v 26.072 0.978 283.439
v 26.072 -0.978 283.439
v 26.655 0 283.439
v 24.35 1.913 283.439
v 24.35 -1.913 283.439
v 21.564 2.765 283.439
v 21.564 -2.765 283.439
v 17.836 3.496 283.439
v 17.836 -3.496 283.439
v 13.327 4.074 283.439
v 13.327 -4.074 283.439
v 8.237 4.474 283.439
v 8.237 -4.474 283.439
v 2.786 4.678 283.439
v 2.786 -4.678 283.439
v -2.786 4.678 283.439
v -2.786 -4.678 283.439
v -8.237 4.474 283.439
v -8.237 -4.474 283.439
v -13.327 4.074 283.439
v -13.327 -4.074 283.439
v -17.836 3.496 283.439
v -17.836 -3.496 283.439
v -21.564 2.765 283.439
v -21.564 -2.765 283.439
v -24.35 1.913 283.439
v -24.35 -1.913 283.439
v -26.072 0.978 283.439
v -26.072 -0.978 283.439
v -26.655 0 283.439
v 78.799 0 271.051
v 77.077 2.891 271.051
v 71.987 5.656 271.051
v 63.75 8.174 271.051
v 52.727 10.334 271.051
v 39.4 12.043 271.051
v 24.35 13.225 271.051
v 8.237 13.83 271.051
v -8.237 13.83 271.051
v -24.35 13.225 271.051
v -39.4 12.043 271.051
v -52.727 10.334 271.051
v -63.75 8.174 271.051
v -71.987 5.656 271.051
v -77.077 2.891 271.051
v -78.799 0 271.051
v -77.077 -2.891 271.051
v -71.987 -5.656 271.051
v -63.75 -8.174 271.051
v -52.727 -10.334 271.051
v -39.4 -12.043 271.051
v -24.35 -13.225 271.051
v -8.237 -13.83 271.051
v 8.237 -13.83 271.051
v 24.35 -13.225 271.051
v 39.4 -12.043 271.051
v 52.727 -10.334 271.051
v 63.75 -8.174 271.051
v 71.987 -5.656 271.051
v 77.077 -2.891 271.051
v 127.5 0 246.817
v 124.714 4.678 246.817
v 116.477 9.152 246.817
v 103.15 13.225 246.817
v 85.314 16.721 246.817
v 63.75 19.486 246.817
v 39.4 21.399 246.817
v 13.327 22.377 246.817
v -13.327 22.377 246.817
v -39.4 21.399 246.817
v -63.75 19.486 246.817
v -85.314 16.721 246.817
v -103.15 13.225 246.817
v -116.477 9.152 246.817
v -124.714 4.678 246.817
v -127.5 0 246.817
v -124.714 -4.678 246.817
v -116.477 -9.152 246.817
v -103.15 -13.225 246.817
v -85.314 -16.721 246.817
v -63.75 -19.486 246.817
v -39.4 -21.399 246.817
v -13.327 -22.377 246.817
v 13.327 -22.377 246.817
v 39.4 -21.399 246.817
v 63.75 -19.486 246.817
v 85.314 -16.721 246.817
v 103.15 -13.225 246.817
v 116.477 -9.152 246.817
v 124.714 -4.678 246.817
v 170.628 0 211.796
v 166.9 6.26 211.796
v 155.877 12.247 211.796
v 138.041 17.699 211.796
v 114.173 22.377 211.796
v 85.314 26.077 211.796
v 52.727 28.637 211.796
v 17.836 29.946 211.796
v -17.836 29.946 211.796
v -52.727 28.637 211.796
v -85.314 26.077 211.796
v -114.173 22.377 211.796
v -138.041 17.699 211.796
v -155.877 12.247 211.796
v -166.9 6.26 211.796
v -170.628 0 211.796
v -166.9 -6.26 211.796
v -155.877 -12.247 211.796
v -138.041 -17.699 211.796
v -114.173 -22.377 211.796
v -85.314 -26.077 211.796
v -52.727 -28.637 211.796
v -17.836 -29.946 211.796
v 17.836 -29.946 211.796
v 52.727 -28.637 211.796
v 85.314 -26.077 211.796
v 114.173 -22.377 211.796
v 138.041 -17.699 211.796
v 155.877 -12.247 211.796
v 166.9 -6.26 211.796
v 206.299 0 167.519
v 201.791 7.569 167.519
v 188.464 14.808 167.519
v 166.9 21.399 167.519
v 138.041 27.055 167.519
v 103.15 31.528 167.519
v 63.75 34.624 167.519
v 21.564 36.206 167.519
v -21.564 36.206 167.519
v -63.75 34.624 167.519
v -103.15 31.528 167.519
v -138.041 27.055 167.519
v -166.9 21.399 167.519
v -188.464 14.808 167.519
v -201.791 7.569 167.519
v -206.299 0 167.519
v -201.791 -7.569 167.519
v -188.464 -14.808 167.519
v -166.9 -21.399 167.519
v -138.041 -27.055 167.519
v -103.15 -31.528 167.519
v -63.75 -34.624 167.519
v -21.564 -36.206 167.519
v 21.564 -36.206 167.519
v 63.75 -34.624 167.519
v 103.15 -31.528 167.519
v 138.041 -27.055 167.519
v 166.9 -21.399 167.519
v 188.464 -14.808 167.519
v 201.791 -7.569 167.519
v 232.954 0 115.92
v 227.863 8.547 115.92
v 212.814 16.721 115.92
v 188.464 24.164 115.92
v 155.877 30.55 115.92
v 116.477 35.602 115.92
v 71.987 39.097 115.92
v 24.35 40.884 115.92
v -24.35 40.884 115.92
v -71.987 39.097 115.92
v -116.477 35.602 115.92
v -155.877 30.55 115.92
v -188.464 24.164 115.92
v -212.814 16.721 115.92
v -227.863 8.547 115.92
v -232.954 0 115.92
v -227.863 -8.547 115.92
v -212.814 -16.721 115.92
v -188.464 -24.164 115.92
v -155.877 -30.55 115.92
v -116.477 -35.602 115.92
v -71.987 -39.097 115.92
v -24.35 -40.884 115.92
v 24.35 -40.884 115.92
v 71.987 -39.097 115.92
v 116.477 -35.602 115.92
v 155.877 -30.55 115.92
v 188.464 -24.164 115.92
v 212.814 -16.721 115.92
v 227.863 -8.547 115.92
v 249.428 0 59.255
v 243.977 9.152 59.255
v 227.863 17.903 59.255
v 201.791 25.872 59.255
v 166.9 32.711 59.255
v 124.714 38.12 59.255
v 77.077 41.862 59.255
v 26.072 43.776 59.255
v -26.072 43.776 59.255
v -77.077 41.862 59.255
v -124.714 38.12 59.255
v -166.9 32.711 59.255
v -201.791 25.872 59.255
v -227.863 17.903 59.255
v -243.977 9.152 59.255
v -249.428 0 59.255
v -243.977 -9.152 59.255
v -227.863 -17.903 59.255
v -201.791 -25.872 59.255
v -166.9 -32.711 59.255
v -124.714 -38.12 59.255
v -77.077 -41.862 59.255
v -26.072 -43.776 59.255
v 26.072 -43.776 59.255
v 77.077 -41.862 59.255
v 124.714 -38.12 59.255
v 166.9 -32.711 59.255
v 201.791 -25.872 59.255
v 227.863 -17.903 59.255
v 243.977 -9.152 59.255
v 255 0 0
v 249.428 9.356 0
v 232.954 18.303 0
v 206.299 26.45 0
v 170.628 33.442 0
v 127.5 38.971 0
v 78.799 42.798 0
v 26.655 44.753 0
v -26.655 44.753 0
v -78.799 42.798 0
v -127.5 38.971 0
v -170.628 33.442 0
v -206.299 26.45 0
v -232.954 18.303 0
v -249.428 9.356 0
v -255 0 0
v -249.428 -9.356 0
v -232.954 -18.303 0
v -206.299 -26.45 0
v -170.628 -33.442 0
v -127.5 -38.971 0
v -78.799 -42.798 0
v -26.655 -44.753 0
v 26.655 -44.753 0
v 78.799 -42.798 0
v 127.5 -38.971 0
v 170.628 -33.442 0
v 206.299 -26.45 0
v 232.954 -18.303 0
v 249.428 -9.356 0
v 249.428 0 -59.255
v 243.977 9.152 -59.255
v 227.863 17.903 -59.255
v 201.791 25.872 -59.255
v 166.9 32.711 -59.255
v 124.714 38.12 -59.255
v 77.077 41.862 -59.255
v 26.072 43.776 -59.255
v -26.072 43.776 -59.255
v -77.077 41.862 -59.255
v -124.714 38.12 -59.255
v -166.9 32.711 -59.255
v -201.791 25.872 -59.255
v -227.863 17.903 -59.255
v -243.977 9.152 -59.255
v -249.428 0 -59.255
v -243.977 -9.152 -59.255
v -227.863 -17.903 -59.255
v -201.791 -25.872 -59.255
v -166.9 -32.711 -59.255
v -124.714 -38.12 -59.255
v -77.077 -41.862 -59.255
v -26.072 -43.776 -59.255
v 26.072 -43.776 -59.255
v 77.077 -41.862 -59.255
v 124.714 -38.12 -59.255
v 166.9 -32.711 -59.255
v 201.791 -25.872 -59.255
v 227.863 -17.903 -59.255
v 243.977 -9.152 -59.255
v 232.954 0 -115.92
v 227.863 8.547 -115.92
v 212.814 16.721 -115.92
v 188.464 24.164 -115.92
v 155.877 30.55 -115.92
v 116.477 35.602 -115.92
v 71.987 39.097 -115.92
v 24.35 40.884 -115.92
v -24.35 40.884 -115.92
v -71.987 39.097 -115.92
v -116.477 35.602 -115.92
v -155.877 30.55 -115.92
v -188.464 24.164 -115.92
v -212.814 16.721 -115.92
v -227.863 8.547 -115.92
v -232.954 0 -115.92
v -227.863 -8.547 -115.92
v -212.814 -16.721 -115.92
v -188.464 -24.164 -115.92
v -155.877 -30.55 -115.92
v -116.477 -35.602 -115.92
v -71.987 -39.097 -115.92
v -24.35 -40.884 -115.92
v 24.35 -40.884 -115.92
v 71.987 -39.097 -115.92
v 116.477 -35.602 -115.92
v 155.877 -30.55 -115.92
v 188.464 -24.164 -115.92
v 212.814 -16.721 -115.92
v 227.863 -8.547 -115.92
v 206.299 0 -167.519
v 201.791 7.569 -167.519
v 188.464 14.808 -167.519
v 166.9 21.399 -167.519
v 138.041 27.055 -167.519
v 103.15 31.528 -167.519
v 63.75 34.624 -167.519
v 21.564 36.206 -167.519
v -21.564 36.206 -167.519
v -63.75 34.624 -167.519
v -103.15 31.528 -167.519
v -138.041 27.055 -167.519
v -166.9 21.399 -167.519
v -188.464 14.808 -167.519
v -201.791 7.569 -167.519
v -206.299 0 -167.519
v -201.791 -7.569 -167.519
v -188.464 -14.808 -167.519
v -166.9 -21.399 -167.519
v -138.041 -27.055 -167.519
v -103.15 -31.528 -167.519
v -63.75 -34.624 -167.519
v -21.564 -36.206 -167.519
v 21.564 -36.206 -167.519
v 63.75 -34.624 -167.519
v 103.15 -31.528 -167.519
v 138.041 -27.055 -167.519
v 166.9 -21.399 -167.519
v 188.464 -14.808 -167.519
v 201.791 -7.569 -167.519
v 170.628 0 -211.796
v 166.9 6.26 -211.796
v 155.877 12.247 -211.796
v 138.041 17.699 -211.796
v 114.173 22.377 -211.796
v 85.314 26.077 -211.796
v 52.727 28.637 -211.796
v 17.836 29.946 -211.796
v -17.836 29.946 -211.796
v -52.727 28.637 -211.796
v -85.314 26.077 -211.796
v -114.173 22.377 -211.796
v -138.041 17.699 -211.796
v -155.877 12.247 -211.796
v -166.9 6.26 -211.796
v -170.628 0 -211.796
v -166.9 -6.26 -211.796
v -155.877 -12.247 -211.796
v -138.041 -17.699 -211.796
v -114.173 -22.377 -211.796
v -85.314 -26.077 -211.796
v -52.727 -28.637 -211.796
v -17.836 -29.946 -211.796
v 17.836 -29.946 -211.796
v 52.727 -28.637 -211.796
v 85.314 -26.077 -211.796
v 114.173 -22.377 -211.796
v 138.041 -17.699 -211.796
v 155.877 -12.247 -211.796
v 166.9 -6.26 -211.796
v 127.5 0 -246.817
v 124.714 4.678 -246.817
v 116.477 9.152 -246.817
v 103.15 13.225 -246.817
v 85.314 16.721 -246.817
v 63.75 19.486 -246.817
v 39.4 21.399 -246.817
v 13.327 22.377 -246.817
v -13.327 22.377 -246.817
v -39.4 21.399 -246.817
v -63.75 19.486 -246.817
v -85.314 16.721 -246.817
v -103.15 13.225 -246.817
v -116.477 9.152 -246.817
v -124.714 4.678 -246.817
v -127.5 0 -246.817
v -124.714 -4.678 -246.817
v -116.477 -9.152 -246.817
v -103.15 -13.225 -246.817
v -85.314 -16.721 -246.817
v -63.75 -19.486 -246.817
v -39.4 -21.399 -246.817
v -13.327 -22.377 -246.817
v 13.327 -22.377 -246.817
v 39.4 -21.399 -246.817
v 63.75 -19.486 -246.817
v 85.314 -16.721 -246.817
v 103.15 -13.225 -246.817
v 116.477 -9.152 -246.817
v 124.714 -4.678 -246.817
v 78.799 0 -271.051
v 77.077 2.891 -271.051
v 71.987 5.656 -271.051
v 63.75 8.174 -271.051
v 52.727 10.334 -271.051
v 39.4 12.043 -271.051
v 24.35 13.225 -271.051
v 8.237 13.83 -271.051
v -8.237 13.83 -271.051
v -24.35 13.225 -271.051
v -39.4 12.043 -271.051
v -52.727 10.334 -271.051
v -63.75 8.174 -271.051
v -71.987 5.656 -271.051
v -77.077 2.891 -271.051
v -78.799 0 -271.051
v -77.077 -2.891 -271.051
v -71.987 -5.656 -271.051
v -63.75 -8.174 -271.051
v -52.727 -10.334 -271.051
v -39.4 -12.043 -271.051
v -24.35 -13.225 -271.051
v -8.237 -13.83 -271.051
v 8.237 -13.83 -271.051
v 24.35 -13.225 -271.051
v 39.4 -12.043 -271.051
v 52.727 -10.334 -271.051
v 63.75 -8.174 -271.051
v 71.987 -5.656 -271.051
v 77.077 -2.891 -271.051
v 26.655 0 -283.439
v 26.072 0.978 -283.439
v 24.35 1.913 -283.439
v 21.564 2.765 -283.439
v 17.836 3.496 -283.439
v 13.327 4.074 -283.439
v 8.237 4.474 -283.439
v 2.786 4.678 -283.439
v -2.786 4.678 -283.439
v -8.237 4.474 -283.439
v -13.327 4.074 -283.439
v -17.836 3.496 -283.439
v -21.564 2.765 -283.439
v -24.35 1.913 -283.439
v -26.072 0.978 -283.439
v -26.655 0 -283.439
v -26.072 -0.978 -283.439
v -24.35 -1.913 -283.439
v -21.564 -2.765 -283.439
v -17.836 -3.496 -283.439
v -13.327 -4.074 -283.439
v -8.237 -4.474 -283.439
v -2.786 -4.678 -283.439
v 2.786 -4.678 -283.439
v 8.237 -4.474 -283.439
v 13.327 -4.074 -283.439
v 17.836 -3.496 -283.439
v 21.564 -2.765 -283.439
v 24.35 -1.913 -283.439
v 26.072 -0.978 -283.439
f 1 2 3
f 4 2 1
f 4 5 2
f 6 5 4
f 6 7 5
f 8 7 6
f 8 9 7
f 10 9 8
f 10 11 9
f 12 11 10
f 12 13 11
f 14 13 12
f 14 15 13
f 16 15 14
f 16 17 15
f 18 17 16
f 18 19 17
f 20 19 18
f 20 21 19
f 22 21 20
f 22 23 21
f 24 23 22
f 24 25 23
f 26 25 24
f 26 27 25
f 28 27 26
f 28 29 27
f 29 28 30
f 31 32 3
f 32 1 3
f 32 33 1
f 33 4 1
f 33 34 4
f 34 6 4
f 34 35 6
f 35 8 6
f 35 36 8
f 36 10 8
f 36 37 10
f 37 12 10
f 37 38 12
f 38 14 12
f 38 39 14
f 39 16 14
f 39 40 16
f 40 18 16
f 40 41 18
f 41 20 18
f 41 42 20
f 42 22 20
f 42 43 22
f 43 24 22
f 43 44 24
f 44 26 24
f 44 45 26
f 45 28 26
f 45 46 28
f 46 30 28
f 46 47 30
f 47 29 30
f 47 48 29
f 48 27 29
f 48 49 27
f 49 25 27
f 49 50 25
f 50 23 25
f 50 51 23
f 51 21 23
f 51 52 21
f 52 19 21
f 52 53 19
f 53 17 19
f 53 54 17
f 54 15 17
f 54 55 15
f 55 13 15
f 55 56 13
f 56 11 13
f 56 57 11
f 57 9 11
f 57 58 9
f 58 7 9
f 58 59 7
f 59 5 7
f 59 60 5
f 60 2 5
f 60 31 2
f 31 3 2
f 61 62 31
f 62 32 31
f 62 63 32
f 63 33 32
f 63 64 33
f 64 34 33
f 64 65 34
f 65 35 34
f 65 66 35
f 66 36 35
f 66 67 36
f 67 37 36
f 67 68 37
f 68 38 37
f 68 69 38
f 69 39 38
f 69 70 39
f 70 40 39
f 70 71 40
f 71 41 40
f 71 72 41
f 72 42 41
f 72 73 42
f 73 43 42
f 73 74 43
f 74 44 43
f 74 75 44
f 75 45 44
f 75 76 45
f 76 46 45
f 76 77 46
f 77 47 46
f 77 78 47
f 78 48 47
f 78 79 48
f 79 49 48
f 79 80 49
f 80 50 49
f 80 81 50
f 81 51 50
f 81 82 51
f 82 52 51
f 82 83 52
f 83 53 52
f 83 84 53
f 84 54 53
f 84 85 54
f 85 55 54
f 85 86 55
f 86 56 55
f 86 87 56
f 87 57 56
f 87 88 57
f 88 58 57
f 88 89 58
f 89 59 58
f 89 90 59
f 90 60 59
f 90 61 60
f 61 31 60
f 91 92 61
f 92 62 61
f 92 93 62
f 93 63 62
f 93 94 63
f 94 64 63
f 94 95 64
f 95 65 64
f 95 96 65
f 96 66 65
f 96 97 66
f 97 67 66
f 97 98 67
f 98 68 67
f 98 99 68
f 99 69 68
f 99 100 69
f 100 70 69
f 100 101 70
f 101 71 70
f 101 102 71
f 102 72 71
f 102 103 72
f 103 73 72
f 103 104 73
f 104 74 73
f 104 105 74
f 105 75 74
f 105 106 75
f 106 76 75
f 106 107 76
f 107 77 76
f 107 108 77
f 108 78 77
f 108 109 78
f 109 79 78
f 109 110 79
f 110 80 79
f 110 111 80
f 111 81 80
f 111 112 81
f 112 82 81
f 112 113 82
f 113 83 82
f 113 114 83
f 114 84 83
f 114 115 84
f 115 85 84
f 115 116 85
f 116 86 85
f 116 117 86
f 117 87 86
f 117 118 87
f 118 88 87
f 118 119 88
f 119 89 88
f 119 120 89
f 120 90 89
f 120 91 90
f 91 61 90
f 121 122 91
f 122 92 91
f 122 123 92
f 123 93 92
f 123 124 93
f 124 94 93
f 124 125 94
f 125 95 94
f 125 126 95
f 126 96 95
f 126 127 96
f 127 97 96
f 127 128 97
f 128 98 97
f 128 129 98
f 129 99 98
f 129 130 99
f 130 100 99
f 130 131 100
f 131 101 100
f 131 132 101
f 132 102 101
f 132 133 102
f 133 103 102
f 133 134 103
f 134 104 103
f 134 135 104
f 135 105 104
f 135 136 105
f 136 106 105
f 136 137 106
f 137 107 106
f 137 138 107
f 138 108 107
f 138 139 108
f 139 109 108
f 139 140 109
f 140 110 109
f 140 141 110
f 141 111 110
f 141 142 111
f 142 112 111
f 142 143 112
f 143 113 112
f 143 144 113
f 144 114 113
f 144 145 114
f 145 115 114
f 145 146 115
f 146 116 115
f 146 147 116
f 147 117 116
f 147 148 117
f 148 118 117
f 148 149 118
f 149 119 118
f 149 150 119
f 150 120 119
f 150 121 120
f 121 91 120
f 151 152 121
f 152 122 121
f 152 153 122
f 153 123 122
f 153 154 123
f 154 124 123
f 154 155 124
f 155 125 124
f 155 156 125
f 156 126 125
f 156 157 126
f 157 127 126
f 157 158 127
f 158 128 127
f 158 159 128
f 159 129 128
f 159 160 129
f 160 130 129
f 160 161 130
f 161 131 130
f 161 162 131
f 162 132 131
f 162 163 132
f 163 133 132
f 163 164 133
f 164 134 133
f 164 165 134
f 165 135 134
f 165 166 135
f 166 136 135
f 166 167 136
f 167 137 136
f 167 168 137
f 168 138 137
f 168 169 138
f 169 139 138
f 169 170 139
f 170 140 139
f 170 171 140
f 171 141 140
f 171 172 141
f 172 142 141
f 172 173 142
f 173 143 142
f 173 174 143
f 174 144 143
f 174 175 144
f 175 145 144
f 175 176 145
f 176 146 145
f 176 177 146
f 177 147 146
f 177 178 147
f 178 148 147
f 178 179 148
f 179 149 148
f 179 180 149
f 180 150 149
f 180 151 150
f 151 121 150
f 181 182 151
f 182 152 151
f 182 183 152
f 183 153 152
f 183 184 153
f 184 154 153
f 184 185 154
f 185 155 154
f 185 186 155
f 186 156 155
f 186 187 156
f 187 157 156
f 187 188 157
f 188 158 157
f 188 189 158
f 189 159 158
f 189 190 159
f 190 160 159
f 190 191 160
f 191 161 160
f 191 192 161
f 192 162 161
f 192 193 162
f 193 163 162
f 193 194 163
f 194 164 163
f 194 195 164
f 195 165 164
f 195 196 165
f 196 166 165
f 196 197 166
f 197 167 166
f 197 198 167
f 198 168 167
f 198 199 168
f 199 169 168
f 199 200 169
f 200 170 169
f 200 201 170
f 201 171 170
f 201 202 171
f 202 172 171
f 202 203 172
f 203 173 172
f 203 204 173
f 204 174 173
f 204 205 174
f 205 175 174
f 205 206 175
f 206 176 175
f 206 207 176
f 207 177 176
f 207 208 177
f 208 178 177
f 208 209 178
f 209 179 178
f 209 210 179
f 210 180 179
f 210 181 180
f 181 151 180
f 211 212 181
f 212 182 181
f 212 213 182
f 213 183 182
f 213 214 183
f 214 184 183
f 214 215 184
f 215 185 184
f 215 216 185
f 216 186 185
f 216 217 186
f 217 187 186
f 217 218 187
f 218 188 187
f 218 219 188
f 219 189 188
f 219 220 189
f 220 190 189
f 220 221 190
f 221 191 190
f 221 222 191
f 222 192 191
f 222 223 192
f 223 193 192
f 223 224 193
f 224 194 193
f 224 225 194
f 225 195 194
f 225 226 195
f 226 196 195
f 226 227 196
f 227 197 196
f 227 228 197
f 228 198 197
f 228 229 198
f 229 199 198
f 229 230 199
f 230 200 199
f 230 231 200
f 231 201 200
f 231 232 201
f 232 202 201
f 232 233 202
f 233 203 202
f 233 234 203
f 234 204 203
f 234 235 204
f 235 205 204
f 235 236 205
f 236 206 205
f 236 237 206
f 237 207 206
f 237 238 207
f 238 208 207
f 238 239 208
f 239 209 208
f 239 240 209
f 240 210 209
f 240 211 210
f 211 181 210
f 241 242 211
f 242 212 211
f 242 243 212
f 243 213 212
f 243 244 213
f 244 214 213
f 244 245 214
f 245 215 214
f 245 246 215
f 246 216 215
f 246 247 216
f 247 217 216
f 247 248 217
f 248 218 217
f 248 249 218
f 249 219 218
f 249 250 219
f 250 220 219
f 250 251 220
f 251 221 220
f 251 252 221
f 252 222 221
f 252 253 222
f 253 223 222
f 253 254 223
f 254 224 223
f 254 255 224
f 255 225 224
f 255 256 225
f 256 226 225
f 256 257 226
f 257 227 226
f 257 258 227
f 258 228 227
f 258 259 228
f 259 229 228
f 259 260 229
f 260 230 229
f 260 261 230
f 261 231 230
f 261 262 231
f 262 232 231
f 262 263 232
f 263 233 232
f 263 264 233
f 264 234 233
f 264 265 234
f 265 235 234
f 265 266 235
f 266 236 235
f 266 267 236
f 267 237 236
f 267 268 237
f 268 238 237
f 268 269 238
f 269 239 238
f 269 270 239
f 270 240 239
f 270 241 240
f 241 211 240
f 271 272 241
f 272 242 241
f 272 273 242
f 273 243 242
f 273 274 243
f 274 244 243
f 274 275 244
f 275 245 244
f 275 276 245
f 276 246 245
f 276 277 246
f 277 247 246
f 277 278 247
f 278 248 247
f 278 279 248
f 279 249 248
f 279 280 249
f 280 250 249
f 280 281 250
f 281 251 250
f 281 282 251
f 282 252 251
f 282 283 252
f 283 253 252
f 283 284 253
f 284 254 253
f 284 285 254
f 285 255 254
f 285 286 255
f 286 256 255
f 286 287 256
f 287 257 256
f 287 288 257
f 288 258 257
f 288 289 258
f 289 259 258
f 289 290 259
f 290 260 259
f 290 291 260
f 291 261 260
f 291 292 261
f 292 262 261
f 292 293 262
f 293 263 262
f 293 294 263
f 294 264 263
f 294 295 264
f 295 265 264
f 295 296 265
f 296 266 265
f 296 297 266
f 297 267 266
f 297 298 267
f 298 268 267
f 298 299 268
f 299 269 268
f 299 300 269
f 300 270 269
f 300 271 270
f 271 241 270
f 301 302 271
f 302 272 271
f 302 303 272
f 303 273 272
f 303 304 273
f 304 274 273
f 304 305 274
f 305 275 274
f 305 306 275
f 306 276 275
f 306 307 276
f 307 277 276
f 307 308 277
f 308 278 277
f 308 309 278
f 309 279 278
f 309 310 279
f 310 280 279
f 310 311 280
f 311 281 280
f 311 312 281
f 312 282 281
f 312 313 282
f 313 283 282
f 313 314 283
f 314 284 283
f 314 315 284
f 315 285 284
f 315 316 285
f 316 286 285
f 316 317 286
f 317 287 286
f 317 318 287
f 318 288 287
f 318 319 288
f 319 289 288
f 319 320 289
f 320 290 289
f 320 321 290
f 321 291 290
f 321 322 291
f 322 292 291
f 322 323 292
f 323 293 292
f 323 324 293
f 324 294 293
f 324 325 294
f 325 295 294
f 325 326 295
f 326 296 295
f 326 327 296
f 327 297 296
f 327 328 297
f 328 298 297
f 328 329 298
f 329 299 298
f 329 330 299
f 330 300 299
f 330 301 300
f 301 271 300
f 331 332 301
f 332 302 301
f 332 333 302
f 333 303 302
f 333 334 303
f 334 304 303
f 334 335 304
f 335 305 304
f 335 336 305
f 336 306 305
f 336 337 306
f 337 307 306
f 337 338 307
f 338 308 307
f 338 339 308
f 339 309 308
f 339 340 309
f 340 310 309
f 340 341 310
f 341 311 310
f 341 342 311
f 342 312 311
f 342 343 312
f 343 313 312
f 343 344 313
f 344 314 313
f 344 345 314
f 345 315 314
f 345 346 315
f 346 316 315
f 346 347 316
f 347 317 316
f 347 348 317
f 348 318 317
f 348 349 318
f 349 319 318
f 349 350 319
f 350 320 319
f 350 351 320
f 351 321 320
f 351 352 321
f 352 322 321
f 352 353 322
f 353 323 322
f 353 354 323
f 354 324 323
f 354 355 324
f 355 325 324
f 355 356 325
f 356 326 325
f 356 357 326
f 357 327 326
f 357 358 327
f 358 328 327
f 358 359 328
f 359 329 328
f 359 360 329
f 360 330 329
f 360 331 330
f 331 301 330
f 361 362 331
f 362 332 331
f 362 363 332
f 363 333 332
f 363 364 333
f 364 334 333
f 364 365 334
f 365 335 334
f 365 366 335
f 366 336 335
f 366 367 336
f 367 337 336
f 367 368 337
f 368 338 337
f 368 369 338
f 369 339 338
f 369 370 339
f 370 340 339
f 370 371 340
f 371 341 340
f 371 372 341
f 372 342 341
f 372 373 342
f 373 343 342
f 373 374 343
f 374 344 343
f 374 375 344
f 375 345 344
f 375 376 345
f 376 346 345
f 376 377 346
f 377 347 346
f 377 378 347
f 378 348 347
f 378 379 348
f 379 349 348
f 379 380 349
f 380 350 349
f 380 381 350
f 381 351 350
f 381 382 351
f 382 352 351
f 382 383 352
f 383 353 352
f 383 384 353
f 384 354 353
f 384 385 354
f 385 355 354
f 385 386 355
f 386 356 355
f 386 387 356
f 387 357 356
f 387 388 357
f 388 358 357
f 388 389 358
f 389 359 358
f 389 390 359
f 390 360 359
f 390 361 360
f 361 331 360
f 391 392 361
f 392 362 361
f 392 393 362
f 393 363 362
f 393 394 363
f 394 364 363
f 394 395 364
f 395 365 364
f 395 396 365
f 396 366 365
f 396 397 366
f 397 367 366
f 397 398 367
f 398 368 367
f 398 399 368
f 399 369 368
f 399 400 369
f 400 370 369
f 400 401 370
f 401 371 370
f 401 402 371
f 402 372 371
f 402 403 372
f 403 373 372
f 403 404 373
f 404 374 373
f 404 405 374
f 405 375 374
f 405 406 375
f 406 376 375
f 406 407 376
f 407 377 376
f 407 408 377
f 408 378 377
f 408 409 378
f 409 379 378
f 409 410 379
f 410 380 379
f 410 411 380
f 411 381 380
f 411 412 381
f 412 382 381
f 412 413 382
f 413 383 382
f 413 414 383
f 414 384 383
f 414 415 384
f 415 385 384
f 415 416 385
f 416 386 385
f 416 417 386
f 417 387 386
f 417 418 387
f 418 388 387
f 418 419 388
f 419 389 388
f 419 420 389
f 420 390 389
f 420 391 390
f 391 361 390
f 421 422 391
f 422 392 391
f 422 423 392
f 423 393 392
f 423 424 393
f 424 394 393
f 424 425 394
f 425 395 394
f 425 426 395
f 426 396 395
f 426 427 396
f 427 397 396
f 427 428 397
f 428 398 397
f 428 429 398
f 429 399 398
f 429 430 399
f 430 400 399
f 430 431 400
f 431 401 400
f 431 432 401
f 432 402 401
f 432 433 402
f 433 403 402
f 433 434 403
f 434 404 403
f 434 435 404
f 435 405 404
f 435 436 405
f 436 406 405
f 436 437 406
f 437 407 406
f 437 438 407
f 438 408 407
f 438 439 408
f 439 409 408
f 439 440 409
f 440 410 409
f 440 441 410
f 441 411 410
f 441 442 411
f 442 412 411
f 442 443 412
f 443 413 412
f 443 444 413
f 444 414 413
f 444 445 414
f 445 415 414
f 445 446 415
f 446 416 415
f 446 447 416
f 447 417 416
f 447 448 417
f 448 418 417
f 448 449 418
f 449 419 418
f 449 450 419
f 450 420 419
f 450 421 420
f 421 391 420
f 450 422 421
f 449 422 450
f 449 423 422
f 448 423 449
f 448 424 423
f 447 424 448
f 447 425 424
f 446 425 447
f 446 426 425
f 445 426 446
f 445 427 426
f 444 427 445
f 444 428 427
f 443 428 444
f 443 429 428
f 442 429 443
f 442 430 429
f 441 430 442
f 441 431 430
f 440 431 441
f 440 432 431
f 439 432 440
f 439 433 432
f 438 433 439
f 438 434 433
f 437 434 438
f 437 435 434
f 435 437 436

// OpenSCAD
// Generated by SolidPython 1.0.1 on 2020-07-29 00:46:52


scale(v = [17, 3, 19]) {
	sphere(r = 15);
}
/***********************************************
*********      SolidPython code:      **********
************************************************
 
# import packages: SolidPython
from solid import *
from solid.utils import *
from itertools import chain, combinations, permutations


class Resize:

    def __init__(self, scad_file):
        self.scad_file = scad_file
        #self.scad_file = import_scad(scad_file)
        # cone/cylinder param:
        self.r1 = 0
        self.r2 = 0
        self.h = 0
        # rectangular prism param:
        self.w = 0
        self.l = 0
        # ellipse param:
        self.r = 0

    # import OpenScad code (file name corresponds to shape)


    # classify shape + parameters
    def assign(self, param1, param2, param3):
        if self.scad_file == 'cone.scad':
            self.r1 = param1
            self.r2 = param2
            self.h = param3
        elif self.scad_file == 'cylinder.scad':
            self.r1 = param1
            self.r2 = param2
            self.h = param3
        elif self.scad_file == 'rectangularPrism.scad':
            self.h = param1
            self.l = param2
            self.w = param3
        else:
            self.r = param1
            self.h = param2

    # resize parameters
    def iterate(self):
        x = range(3, 20, 2)
        i = 1
        if self.scad_file == 'cone.scad':
            tempList = list(permutations(x, 2))
            for temp in tempList:
                param1 = temp[0]
                param2 = temp[1]
                filepath = 'produced_scad_files/' + 'cone' + str(param1) + '_' + str(param2) + '_' + '.scad'
                scad_render_to_file(cylinder(h=param1, r1=param2, r2=0), filepath)

        elif self.scad_file == 'cylinder.scad':
            tempList = list(permutations(x, 3))
            for temp in tempList:
                param1 = temp[0]
                param2 = temp[1]
                filepath = 'produced_scad_files/' + 'cylinder' + str(param1) + '_' + str(param2) + '_' + '.scad'
                scad_render_to_file(cylinder(h=param1, r1=param2, r2=param2), filepath)

        elif self.scad_file == 'rectangularPrism.scad':
            tempList = list(permutations(x, 3))
            for temp in tempList:
                param1 = temp[0]
                param2 = temp[1]
                param3 = temp[2]
                filepath = 'produced_scad_files/' + 'rectangularPrism' + str(param1) + '_' + str(param2) + '_' + str(
                    param3) + '.scad'
                scad_render_to_file(cube(size=(param1, param2, param3)), filepath)

        elif self.scad_file == 'ellipse.scad':
            tempList = list(permutations(x, 4))
            for temp in tempList:
                param1 = temp[0]
                param2 = temp[1]
                param3 = temp[2]
                param4 = temp[3]
                filepath = 'produced_scad_files/' + 'ellipse' + str(param1) + '_' + str(param2) + '_' + str(param3) + '_' + str(param4) + '.scad'
                scad_render_to_file(scale([param1, param2, param3])(sphere(r=param4)), filepath)

    def render_to_scadfile(self):
        scad_render_to_file(scad, 'example.scad') 
 
************************************************/
